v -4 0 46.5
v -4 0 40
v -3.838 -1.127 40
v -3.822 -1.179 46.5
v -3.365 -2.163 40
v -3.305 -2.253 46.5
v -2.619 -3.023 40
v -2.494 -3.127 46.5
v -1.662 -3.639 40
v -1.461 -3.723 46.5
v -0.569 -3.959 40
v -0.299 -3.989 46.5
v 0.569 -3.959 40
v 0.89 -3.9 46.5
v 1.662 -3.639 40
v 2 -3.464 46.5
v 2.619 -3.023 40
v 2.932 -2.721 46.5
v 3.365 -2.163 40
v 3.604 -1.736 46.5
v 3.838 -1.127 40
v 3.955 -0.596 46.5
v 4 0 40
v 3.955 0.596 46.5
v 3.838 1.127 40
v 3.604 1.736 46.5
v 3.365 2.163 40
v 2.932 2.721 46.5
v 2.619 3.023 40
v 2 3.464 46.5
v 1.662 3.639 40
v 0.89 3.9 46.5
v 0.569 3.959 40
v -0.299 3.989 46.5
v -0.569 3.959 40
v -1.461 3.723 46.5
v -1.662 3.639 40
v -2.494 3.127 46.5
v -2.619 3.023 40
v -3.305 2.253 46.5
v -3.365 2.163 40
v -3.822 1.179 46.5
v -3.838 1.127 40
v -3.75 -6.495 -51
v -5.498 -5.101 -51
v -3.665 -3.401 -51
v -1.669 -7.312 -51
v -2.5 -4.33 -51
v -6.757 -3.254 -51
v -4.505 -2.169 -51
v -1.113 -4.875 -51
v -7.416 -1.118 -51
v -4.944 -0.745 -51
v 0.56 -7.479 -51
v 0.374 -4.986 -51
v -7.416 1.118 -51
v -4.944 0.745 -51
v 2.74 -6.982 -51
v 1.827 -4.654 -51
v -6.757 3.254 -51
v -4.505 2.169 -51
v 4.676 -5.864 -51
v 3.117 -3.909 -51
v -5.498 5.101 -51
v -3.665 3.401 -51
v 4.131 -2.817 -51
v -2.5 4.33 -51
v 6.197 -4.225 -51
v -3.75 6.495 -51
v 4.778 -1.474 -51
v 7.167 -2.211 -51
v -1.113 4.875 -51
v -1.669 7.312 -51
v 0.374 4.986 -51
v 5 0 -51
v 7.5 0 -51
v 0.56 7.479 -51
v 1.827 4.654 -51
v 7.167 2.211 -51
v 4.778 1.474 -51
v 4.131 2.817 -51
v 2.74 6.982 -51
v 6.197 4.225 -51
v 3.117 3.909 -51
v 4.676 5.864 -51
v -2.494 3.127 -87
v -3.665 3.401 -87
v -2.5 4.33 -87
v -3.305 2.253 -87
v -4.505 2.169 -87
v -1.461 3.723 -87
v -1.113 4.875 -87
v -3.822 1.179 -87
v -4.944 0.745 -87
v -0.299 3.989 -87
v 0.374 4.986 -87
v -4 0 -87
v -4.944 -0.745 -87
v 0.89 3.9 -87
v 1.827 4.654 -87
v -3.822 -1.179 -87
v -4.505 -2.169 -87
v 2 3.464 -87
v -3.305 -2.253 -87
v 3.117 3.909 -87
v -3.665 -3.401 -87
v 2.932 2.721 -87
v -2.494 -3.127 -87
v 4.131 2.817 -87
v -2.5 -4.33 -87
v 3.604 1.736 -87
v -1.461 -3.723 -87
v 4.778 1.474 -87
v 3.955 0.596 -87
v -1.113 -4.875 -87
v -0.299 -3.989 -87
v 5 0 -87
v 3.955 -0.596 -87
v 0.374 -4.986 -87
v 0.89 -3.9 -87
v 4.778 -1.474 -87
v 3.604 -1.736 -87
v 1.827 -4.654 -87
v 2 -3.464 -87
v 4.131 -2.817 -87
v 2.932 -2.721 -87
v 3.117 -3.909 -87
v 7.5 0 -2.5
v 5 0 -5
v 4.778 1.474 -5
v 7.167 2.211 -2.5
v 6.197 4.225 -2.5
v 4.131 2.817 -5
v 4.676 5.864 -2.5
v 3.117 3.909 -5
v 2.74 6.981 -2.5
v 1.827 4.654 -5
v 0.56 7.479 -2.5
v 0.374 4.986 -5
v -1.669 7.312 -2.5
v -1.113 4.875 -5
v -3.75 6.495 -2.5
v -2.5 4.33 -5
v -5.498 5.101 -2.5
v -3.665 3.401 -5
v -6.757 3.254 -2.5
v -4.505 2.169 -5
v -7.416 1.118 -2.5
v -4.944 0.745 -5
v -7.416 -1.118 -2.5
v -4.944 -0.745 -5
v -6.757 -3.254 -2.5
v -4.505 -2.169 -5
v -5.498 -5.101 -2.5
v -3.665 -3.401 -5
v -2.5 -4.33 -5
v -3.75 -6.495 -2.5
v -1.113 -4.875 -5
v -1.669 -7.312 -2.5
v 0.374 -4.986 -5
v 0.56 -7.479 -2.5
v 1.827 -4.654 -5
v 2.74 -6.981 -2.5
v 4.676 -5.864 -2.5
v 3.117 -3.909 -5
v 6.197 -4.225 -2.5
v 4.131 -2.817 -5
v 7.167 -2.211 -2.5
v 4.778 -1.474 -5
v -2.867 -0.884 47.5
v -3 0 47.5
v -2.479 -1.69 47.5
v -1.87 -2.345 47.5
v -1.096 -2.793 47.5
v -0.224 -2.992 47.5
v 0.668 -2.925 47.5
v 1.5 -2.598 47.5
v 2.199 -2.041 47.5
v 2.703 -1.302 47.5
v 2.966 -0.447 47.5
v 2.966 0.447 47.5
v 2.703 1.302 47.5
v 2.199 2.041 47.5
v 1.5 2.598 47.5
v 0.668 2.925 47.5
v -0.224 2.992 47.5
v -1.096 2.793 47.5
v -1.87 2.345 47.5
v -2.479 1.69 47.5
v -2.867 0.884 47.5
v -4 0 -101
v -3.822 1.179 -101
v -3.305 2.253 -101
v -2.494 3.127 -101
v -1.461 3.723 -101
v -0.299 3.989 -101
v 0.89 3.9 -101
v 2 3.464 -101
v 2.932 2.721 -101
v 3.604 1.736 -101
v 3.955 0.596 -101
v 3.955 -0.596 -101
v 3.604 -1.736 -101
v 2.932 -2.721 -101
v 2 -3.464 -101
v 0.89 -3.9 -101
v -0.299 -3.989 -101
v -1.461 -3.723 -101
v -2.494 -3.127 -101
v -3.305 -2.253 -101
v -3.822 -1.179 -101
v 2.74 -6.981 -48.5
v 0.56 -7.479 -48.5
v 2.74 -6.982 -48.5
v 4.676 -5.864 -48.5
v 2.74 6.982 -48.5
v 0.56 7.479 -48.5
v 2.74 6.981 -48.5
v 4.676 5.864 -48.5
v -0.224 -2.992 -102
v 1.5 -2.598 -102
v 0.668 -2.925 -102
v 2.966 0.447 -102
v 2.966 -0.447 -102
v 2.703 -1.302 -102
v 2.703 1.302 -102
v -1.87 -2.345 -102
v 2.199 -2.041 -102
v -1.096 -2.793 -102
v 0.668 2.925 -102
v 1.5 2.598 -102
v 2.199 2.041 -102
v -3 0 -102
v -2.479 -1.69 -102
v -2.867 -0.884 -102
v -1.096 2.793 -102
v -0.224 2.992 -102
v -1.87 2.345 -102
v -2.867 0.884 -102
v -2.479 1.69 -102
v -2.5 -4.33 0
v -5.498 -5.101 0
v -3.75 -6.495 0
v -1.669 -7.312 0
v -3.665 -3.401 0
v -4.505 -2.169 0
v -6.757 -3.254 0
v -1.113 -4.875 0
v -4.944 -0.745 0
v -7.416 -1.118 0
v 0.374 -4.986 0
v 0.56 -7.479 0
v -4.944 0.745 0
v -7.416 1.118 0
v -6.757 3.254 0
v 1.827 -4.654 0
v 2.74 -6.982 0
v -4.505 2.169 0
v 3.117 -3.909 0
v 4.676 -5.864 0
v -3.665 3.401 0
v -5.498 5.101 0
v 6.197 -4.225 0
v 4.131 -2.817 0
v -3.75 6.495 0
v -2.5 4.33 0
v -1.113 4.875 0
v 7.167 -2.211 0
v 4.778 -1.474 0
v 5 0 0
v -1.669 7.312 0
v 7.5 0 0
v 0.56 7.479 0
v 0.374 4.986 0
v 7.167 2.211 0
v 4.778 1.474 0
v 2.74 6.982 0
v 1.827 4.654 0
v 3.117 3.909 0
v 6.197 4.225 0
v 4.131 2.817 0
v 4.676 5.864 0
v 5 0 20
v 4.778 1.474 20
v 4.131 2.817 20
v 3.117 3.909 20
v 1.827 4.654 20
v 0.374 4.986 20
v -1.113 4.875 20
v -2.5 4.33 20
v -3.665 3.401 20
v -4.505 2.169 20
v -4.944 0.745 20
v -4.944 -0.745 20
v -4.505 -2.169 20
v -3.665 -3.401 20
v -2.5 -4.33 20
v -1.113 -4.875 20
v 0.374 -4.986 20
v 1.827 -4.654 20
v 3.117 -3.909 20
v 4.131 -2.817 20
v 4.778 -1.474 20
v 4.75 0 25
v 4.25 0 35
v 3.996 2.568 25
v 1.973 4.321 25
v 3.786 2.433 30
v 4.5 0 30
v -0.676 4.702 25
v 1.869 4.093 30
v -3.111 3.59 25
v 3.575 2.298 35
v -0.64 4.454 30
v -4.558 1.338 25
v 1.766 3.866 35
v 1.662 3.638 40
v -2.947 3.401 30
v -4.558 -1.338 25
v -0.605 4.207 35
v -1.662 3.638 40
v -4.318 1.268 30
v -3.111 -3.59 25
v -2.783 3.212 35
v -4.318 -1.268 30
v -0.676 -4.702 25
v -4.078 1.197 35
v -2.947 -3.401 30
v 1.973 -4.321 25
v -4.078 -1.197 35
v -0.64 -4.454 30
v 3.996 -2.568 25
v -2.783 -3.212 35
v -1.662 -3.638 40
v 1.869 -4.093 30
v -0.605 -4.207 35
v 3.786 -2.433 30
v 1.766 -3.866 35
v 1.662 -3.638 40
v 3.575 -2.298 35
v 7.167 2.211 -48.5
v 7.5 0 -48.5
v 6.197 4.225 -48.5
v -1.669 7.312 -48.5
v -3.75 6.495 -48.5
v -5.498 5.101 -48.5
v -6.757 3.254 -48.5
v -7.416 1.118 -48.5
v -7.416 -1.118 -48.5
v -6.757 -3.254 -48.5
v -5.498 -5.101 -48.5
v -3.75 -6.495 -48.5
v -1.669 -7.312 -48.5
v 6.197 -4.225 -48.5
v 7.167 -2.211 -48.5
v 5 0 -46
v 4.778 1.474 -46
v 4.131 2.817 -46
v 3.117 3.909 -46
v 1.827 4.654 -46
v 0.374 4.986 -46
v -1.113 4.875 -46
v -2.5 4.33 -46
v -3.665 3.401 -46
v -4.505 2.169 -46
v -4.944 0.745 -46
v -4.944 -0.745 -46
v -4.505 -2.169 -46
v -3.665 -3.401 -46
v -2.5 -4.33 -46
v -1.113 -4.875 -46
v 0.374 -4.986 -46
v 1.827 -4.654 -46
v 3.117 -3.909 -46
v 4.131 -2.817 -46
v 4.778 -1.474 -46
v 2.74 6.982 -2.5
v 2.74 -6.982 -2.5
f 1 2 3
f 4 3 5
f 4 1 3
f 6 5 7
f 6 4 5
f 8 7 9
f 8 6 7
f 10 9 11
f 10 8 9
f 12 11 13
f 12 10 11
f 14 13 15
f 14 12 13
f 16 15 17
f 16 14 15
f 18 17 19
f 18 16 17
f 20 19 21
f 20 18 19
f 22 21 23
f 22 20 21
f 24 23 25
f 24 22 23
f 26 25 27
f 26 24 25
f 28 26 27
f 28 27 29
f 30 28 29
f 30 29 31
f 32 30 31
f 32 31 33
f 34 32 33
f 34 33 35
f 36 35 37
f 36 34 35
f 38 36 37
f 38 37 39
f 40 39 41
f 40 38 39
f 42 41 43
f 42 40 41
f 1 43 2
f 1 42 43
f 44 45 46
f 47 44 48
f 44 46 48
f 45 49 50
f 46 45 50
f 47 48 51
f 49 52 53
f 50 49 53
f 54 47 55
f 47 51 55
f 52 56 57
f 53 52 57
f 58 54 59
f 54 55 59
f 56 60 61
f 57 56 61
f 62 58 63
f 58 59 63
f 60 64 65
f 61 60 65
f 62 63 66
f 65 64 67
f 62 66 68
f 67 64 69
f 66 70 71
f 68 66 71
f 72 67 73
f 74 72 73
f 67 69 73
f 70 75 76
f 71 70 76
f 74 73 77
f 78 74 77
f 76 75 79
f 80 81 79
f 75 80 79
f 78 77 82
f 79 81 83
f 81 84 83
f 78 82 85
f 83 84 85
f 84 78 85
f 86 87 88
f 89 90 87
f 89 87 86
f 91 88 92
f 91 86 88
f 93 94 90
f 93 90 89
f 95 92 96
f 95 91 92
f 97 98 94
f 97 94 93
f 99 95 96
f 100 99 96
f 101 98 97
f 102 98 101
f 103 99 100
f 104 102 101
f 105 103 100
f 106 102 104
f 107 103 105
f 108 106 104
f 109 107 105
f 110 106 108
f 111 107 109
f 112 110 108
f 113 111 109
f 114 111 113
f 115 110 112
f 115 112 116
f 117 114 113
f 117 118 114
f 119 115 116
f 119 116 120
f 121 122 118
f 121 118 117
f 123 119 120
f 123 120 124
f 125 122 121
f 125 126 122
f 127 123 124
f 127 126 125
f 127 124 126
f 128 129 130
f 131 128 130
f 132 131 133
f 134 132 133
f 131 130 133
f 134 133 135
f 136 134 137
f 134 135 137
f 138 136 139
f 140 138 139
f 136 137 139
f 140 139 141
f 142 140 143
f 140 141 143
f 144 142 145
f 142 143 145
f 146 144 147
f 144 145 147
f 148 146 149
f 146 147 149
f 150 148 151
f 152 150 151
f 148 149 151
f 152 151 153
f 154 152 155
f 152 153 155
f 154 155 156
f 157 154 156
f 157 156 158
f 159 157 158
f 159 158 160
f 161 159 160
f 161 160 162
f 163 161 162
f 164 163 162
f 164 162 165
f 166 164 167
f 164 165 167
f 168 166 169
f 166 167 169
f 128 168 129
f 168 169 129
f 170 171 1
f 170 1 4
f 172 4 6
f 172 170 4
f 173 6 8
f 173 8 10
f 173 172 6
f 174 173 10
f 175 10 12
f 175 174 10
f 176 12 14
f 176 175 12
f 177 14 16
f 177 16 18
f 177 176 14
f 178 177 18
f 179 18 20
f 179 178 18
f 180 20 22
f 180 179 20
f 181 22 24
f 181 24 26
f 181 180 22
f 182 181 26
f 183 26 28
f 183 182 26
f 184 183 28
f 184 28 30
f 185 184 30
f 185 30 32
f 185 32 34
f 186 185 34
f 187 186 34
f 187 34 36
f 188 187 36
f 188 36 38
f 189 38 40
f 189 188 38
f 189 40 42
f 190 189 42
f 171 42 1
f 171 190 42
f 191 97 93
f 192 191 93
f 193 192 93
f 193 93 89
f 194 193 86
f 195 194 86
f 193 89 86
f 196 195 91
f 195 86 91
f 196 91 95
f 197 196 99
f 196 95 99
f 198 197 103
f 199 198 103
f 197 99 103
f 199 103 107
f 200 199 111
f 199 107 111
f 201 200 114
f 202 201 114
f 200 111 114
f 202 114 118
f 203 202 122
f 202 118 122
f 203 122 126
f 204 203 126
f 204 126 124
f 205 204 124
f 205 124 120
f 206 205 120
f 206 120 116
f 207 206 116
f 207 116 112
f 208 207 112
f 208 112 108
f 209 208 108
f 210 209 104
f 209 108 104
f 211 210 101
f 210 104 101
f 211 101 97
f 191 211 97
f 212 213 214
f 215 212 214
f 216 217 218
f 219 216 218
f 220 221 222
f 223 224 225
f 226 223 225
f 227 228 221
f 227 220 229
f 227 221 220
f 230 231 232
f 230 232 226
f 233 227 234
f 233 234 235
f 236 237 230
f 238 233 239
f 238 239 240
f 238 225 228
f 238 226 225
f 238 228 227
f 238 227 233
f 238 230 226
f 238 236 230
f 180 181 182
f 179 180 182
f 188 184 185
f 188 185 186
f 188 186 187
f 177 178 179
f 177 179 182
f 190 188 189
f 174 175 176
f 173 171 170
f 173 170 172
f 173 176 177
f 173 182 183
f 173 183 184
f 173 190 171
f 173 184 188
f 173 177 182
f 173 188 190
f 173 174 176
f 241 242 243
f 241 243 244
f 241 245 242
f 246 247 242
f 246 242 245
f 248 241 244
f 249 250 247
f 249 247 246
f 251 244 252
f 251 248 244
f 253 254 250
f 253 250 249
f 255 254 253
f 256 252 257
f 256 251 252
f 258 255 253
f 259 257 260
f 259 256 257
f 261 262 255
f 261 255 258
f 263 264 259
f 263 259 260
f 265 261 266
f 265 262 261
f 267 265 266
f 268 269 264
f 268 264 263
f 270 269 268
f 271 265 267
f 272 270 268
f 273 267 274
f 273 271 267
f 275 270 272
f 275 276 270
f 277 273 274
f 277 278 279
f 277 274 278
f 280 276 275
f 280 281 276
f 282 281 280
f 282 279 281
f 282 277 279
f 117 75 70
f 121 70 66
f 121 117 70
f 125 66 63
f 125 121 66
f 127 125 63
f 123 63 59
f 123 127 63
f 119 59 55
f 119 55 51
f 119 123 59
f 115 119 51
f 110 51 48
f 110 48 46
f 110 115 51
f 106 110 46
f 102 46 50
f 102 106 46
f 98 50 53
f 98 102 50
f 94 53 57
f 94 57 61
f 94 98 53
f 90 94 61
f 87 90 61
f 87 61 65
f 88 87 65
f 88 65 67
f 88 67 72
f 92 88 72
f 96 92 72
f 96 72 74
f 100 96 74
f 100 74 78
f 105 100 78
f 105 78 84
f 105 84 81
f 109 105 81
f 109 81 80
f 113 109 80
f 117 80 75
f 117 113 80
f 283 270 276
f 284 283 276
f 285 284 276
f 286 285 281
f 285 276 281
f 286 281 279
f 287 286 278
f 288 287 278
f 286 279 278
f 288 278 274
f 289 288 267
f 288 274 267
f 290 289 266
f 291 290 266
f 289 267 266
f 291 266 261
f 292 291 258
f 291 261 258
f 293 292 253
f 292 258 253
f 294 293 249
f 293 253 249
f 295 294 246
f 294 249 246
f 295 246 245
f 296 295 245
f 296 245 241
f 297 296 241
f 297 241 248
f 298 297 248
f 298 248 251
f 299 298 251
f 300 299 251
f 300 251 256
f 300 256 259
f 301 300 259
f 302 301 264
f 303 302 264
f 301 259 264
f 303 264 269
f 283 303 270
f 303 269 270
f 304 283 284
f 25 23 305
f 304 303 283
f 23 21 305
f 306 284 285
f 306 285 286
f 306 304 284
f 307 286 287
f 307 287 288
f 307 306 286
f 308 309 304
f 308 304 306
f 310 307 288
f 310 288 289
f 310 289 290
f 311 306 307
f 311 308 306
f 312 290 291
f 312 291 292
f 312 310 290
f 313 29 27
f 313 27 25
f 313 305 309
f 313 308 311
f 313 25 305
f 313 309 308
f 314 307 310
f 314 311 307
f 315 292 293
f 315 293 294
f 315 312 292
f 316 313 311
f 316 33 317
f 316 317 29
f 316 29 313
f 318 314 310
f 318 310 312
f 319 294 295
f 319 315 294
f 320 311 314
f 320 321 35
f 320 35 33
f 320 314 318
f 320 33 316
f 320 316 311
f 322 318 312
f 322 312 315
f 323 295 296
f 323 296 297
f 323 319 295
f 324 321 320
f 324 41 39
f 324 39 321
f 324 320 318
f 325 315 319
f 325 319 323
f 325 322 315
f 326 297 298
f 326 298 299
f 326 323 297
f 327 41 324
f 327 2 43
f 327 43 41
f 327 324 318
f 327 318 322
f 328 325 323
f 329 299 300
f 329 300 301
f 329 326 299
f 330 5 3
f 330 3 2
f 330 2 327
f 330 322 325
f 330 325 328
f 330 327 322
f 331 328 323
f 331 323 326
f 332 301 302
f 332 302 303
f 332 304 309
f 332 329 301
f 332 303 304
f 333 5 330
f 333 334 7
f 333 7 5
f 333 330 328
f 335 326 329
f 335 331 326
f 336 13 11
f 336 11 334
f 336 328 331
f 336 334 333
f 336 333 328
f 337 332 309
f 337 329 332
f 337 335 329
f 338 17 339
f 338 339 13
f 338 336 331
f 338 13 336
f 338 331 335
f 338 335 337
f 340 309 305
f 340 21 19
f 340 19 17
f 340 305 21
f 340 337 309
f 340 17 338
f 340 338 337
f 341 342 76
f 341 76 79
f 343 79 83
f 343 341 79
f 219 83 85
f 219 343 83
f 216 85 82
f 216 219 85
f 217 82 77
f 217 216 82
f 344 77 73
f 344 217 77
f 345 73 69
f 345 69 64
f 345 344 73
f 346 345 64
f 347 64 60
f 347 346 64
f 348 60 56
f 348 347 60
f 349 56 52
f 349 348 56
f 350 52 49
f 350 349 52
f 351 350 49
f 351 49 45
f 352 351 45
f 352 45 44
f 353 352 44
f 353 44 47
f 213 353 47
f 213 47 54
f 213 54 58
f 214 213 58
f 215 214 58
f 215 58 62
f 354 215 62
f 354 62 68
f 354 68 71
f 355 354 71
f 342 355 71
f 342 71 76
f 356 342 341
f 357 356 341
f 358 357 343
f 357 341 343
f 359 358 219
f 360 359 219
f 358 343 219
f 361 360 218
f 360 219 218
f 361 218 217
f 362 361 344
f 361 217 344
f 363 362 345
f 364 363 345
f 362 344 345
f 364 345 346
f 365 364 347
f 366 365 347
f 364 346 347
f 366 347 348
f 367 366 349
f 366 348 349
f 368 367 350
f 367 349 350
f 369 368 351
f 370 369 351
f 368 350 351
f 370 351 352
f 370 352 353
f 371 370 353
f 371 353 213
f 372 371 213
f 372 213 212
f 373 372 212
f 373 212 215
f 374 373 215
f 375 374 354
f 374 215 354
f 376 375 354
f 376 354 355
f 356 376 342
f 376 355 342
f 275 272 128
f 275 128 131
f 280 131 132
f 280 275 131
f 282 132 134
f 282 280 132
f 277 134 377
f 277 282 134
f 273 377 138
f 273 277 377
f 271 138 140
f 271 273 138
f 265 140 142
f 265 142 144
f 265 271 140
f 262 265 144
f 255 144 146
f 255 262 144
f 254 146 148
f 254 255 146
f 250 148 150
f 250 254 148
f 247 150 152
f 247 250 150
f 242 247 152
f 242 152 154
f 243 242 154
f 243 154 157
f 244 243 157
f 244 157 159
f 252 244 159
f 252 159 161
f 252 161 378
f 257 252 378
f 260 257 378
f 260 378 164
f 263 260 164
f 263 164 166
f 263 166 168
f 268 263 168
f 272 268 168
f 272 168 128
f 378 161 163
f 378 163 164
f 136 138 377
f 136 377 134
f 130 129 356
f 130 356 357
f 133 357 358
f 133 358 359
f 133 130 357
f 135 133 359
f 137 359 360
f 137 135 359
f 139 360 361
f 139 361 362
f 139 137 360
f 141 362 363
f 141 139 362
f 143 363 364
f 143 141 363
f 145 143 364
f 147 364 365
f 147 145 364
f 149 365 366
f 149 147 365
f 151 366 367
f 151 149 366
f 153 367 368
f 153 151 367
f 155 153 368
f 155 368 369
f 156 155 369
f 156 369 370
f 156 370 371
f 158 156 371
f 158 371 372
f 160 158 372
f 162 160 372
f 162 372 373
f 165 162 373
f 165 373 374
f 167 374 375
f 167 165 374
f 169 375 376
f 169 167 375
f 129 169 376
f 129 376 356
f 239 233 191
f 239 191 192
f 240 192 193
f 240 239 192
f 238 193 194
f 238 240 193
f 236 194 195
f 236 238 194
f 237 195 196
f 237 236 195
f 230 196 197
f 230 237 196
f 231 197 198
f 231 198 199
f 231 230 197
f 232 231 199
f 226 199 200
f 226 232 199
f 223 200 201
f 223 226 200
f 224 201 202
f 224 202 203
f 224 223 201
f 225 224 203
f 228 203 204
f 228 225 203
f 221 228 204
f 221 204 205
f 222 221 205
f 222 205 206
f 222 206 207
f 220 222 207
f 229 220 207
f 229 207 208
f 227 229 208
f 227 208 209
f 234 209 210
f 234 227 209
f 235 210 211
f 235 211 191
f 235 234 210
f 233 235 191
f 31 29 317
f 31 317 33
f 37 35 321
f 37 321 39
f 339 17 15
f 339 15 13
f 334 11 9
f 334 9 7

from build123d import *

# Parameters (mm, degrees)
SKETCH_1_R          = 7.5
EXTRUDE_1_DEPTH     = 51
SKETCH_2_R          = 5
EXTRUDE_2_DEPTH     = 20
EXTRUDE_START       = 36
SKETCH_3_R          = 5
EXTRUDE_3_DEPTH     = 36
SKETCH_4_OUTSIDE_W  = 38.816
SKETCH_4_OUTSIDE_H  = 38.816
SKETCH_4_OUTSIDE_R  = 5
CUT_EXTRUDE_1_DEPTH = 46
SKETCH_5_R          = 4
EXTRUDE_4_DEPTH     = 15
SKETCH_6_R          = 5
EXTRUDE_5_DEPTH     = 20
EXTRUDE_5_TAPER     = 2.8625
EXTRUDE_START_2     = 7.5
SKETCH_7_R          = 4
EXTRUDE_6_DEPTH     = 7.5
CHAMFER_1_SIZE      = 2.5
CHAMFER_2_SIZE      = 1


with BuildPart() as part:
    # Эскиз1 → Бобышка-Вытянуть1 (new body)
    with BuildSketch(Plane.XY):
        Circle(SKETCH_1_R)
    extrude(amount=-EXTRUDE_1_DEPTH)

    # Эскиз2 → Бобышка-Вытянуть2 (add)
    with BuildSketch(Plane.XY):
        Circle(SKETCH_2_R)
    extrude(amount=EXTRUDE_2_DEPTH)

    # Эскиз3 → Бобышка-Вытянуть3 (add)
    with BuildSketch(Plane(origin=(0, 0, -51), x_dir=(-1, 0, 0), z_dir=(0, 0, -1)).offset(EXTRUDE_START)):
        with Locations(Location((0, 0, 0), (0, 0, 180))):
            Circle(SKETCH_3_R)
    extrude(amount=-EXTRUDE_3_DEPTH)

    # Эскиз4 outside → Вырез-Вытянуть1 (cut)
    with BuildSketch(Plane.XY.offset(-2.5)):
        Rectangle(SKETCH_4_OUTSIDE_W, SKETCH_4_OUTSIDE_H)
        Circle(SKETCH_4_OUTSIDE_R, mode=Mode.SUBTRACT)
    extrude(amount=-CUT_EXTRUDE_1_DEPTH, mode=Mode.SUBTRACT)

    # Эскиз5 → Бобышка-Вытянуть4 (add)
    with BuildSketch(Plane(origin=(0, 0, -87), x_dir=(-1, 0, 0), z_dir=(0, 0, -1))):
        Circle(SKETCH_5_R)
    extrude(amount=EXTRUDE_4_DEPTH)

    # Эскиз6 → Бобышка-Вытянуть5 (add)
    with BuildSketch(Plane.XY.offset(20)):
        Circle(SKETCH_6_R)
    extrude(amount=EXTRUDE_5_DEPTH, taper=EXTRUDE_5_TAPER)

    # Эскиз7 → Бобышка-Вытянуть6 (add)
    with BuildSketch(Plane.XY.offset(40).offset(EXTRUDE_START_2)):
        with Locations(Location((0, 0, 0), (0, 0, 180))):
            Circle(SKETCH_7_R)
    extrude(amount=-EXTRUDE_6_DEPTH)

    # Фаска1
    chamfer_1_edges = [part.edges().sort_by_distance(p)[0] for p in [
        (-5, 0, -48.5),
        (-5, 0, -2.5),
    ]]
    chamfer(chamfer_1_edges, length=CHAMFER_1_SIZE - 0.0001)  # a hair under: the kernel refuses the full size

    # Фаска2
    chamfer_2_edges = [part.edges().sort_by_distance(p)[0] for p in [
        (4, 0, -102),
        (4, 0, 47.5),
    ]]
    chamfer(chamfer_2_edges, length=CHAMFER_2_SIZE)


solid = part.part
